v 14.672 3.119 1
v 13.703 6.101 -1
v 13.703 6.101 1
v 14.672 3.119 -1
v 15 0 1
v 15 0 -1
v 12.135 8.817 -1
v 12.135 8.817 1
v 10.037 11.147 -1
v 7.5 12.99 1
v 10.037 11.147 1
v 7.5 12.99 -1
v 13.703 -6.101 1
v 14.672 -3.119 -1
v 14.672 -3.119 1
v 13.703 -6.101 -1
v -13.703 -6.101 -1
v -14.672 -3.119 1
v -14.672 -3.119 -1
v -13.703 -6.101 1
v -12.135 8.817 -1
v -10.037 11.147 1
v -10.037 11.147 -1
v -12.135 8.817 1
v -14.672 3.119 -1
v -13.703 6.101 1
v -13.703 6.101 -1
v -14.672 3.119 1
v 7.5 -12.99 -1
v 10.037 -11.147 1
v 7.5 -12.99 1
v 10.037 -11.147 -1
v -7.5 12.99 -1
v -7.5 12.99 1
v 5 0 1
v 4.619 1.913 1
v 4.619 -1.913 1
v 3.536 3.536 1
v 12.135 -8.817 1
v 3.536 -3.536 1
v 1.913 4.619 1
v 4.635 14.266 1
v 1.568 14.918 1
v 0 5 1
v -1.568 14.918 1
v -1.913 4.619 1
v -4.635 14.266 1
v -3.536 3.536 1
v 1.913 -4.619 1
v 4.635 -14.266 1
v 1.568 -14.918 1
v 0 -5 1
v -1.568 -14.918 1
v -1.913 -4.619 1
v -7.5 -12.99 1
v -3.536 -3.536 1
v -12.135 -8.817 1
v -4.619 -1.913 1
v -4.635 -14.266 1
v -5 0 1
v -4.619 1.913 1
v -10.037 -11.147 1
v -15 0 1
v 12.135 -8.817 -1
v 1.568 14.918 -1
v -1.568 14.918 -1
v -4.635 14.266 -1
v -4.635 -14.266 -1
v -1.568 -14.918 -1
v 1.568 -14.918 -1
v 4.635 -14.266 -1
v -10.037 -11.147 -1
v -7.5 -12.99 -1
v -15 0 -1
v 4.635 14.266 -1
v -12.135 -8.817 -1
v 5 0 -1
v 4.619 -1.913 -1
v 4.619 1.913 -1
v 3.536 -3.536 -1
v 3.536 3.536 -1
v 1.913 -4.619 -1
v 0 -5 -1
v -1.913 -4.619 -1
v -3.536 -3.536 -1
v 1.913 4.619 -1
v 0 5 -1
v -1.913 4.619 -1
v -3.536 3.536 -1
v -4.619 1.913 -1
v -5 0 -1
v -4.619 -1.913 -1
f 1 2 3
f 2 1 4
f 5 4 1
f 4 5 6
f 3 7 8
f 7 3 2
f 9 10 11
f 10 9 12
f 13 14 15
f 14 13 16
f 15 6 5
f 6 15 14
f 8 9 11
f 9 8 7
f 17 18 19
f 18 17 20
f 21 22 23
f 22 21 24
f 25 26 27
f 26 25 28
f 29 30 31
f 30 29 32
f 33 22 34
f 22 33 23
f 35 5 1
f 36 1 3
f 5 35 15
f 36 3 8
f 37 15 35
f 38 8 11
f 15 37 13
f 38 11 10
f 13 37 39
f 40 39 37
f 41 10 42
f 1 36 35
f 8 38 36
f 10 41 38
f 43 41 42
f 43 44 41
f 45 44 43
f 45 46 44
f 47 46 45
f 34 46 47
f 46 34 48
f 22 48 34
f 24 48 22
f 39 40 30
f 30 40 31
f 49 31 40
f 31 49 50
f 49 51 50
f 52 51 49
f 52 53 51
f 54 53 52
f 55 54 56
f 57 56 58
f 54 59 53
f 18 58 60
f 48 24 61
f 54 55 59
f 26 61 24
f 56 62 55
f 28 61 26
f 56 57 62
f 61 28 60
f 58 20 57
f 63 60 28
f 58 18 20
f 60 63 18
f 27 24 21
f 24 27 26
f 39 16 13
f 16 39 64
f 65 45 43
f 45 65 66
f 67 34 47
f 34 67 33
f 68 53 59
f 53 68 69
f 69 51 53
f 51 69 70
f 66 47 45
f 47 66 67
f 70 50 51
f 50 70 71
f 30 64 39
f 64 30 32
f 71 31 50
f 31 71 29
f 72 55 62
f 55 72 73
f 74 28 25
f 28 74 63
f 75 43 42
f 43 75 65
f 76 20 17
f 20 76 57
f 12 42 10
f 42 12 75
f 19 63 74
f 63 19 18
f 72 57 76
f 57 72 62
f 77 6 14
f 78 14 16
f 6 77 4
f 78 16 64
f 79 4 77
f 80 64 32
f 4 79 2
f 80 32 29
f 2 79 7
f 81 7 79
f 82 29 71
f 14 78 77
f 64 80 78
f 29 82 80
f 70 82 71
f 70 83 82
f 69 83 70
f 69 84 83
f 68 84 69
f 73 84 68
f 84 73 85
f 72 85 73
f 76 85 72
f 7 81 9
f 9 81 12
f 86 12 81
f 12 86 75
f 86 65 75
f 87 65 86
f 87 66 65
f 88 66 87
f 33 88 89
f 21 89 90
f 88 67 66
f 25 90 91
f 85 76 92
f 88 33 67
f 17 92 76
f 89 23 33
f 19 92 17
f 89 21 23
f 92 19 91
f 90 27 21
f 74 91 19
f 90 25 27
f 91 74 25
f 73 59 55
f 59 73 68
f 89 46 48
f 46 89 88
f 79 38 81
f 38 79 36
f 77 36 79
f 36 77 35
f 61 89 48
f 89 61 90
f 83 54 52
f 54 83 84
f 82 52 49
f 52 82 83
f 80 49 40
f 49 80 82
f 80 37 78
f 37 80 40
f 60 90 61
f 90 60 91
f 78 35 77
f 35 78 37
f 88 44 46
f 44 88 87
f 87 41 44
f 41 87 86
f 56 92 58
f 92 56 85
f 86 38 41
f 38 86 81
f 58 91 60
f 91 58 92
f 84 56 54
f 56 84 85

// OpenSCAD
// Parameters for the washer
inner_diameter = 10; // Inner diameter of the washer
outer_diameter = 30; // Outer diameter of the washer
thickness = 2;       // Thickness of the washer

// Washer body
module washer_body() {
    difference() {
        // Outer cylinder
        cylinder(h = thickness, d = outer_diameter, center = true);
        // Inner hole
        cylinder(h = thickness + 1, d = inner_diameter, center = true);
    }
}

// Render the washer
washer_body();
